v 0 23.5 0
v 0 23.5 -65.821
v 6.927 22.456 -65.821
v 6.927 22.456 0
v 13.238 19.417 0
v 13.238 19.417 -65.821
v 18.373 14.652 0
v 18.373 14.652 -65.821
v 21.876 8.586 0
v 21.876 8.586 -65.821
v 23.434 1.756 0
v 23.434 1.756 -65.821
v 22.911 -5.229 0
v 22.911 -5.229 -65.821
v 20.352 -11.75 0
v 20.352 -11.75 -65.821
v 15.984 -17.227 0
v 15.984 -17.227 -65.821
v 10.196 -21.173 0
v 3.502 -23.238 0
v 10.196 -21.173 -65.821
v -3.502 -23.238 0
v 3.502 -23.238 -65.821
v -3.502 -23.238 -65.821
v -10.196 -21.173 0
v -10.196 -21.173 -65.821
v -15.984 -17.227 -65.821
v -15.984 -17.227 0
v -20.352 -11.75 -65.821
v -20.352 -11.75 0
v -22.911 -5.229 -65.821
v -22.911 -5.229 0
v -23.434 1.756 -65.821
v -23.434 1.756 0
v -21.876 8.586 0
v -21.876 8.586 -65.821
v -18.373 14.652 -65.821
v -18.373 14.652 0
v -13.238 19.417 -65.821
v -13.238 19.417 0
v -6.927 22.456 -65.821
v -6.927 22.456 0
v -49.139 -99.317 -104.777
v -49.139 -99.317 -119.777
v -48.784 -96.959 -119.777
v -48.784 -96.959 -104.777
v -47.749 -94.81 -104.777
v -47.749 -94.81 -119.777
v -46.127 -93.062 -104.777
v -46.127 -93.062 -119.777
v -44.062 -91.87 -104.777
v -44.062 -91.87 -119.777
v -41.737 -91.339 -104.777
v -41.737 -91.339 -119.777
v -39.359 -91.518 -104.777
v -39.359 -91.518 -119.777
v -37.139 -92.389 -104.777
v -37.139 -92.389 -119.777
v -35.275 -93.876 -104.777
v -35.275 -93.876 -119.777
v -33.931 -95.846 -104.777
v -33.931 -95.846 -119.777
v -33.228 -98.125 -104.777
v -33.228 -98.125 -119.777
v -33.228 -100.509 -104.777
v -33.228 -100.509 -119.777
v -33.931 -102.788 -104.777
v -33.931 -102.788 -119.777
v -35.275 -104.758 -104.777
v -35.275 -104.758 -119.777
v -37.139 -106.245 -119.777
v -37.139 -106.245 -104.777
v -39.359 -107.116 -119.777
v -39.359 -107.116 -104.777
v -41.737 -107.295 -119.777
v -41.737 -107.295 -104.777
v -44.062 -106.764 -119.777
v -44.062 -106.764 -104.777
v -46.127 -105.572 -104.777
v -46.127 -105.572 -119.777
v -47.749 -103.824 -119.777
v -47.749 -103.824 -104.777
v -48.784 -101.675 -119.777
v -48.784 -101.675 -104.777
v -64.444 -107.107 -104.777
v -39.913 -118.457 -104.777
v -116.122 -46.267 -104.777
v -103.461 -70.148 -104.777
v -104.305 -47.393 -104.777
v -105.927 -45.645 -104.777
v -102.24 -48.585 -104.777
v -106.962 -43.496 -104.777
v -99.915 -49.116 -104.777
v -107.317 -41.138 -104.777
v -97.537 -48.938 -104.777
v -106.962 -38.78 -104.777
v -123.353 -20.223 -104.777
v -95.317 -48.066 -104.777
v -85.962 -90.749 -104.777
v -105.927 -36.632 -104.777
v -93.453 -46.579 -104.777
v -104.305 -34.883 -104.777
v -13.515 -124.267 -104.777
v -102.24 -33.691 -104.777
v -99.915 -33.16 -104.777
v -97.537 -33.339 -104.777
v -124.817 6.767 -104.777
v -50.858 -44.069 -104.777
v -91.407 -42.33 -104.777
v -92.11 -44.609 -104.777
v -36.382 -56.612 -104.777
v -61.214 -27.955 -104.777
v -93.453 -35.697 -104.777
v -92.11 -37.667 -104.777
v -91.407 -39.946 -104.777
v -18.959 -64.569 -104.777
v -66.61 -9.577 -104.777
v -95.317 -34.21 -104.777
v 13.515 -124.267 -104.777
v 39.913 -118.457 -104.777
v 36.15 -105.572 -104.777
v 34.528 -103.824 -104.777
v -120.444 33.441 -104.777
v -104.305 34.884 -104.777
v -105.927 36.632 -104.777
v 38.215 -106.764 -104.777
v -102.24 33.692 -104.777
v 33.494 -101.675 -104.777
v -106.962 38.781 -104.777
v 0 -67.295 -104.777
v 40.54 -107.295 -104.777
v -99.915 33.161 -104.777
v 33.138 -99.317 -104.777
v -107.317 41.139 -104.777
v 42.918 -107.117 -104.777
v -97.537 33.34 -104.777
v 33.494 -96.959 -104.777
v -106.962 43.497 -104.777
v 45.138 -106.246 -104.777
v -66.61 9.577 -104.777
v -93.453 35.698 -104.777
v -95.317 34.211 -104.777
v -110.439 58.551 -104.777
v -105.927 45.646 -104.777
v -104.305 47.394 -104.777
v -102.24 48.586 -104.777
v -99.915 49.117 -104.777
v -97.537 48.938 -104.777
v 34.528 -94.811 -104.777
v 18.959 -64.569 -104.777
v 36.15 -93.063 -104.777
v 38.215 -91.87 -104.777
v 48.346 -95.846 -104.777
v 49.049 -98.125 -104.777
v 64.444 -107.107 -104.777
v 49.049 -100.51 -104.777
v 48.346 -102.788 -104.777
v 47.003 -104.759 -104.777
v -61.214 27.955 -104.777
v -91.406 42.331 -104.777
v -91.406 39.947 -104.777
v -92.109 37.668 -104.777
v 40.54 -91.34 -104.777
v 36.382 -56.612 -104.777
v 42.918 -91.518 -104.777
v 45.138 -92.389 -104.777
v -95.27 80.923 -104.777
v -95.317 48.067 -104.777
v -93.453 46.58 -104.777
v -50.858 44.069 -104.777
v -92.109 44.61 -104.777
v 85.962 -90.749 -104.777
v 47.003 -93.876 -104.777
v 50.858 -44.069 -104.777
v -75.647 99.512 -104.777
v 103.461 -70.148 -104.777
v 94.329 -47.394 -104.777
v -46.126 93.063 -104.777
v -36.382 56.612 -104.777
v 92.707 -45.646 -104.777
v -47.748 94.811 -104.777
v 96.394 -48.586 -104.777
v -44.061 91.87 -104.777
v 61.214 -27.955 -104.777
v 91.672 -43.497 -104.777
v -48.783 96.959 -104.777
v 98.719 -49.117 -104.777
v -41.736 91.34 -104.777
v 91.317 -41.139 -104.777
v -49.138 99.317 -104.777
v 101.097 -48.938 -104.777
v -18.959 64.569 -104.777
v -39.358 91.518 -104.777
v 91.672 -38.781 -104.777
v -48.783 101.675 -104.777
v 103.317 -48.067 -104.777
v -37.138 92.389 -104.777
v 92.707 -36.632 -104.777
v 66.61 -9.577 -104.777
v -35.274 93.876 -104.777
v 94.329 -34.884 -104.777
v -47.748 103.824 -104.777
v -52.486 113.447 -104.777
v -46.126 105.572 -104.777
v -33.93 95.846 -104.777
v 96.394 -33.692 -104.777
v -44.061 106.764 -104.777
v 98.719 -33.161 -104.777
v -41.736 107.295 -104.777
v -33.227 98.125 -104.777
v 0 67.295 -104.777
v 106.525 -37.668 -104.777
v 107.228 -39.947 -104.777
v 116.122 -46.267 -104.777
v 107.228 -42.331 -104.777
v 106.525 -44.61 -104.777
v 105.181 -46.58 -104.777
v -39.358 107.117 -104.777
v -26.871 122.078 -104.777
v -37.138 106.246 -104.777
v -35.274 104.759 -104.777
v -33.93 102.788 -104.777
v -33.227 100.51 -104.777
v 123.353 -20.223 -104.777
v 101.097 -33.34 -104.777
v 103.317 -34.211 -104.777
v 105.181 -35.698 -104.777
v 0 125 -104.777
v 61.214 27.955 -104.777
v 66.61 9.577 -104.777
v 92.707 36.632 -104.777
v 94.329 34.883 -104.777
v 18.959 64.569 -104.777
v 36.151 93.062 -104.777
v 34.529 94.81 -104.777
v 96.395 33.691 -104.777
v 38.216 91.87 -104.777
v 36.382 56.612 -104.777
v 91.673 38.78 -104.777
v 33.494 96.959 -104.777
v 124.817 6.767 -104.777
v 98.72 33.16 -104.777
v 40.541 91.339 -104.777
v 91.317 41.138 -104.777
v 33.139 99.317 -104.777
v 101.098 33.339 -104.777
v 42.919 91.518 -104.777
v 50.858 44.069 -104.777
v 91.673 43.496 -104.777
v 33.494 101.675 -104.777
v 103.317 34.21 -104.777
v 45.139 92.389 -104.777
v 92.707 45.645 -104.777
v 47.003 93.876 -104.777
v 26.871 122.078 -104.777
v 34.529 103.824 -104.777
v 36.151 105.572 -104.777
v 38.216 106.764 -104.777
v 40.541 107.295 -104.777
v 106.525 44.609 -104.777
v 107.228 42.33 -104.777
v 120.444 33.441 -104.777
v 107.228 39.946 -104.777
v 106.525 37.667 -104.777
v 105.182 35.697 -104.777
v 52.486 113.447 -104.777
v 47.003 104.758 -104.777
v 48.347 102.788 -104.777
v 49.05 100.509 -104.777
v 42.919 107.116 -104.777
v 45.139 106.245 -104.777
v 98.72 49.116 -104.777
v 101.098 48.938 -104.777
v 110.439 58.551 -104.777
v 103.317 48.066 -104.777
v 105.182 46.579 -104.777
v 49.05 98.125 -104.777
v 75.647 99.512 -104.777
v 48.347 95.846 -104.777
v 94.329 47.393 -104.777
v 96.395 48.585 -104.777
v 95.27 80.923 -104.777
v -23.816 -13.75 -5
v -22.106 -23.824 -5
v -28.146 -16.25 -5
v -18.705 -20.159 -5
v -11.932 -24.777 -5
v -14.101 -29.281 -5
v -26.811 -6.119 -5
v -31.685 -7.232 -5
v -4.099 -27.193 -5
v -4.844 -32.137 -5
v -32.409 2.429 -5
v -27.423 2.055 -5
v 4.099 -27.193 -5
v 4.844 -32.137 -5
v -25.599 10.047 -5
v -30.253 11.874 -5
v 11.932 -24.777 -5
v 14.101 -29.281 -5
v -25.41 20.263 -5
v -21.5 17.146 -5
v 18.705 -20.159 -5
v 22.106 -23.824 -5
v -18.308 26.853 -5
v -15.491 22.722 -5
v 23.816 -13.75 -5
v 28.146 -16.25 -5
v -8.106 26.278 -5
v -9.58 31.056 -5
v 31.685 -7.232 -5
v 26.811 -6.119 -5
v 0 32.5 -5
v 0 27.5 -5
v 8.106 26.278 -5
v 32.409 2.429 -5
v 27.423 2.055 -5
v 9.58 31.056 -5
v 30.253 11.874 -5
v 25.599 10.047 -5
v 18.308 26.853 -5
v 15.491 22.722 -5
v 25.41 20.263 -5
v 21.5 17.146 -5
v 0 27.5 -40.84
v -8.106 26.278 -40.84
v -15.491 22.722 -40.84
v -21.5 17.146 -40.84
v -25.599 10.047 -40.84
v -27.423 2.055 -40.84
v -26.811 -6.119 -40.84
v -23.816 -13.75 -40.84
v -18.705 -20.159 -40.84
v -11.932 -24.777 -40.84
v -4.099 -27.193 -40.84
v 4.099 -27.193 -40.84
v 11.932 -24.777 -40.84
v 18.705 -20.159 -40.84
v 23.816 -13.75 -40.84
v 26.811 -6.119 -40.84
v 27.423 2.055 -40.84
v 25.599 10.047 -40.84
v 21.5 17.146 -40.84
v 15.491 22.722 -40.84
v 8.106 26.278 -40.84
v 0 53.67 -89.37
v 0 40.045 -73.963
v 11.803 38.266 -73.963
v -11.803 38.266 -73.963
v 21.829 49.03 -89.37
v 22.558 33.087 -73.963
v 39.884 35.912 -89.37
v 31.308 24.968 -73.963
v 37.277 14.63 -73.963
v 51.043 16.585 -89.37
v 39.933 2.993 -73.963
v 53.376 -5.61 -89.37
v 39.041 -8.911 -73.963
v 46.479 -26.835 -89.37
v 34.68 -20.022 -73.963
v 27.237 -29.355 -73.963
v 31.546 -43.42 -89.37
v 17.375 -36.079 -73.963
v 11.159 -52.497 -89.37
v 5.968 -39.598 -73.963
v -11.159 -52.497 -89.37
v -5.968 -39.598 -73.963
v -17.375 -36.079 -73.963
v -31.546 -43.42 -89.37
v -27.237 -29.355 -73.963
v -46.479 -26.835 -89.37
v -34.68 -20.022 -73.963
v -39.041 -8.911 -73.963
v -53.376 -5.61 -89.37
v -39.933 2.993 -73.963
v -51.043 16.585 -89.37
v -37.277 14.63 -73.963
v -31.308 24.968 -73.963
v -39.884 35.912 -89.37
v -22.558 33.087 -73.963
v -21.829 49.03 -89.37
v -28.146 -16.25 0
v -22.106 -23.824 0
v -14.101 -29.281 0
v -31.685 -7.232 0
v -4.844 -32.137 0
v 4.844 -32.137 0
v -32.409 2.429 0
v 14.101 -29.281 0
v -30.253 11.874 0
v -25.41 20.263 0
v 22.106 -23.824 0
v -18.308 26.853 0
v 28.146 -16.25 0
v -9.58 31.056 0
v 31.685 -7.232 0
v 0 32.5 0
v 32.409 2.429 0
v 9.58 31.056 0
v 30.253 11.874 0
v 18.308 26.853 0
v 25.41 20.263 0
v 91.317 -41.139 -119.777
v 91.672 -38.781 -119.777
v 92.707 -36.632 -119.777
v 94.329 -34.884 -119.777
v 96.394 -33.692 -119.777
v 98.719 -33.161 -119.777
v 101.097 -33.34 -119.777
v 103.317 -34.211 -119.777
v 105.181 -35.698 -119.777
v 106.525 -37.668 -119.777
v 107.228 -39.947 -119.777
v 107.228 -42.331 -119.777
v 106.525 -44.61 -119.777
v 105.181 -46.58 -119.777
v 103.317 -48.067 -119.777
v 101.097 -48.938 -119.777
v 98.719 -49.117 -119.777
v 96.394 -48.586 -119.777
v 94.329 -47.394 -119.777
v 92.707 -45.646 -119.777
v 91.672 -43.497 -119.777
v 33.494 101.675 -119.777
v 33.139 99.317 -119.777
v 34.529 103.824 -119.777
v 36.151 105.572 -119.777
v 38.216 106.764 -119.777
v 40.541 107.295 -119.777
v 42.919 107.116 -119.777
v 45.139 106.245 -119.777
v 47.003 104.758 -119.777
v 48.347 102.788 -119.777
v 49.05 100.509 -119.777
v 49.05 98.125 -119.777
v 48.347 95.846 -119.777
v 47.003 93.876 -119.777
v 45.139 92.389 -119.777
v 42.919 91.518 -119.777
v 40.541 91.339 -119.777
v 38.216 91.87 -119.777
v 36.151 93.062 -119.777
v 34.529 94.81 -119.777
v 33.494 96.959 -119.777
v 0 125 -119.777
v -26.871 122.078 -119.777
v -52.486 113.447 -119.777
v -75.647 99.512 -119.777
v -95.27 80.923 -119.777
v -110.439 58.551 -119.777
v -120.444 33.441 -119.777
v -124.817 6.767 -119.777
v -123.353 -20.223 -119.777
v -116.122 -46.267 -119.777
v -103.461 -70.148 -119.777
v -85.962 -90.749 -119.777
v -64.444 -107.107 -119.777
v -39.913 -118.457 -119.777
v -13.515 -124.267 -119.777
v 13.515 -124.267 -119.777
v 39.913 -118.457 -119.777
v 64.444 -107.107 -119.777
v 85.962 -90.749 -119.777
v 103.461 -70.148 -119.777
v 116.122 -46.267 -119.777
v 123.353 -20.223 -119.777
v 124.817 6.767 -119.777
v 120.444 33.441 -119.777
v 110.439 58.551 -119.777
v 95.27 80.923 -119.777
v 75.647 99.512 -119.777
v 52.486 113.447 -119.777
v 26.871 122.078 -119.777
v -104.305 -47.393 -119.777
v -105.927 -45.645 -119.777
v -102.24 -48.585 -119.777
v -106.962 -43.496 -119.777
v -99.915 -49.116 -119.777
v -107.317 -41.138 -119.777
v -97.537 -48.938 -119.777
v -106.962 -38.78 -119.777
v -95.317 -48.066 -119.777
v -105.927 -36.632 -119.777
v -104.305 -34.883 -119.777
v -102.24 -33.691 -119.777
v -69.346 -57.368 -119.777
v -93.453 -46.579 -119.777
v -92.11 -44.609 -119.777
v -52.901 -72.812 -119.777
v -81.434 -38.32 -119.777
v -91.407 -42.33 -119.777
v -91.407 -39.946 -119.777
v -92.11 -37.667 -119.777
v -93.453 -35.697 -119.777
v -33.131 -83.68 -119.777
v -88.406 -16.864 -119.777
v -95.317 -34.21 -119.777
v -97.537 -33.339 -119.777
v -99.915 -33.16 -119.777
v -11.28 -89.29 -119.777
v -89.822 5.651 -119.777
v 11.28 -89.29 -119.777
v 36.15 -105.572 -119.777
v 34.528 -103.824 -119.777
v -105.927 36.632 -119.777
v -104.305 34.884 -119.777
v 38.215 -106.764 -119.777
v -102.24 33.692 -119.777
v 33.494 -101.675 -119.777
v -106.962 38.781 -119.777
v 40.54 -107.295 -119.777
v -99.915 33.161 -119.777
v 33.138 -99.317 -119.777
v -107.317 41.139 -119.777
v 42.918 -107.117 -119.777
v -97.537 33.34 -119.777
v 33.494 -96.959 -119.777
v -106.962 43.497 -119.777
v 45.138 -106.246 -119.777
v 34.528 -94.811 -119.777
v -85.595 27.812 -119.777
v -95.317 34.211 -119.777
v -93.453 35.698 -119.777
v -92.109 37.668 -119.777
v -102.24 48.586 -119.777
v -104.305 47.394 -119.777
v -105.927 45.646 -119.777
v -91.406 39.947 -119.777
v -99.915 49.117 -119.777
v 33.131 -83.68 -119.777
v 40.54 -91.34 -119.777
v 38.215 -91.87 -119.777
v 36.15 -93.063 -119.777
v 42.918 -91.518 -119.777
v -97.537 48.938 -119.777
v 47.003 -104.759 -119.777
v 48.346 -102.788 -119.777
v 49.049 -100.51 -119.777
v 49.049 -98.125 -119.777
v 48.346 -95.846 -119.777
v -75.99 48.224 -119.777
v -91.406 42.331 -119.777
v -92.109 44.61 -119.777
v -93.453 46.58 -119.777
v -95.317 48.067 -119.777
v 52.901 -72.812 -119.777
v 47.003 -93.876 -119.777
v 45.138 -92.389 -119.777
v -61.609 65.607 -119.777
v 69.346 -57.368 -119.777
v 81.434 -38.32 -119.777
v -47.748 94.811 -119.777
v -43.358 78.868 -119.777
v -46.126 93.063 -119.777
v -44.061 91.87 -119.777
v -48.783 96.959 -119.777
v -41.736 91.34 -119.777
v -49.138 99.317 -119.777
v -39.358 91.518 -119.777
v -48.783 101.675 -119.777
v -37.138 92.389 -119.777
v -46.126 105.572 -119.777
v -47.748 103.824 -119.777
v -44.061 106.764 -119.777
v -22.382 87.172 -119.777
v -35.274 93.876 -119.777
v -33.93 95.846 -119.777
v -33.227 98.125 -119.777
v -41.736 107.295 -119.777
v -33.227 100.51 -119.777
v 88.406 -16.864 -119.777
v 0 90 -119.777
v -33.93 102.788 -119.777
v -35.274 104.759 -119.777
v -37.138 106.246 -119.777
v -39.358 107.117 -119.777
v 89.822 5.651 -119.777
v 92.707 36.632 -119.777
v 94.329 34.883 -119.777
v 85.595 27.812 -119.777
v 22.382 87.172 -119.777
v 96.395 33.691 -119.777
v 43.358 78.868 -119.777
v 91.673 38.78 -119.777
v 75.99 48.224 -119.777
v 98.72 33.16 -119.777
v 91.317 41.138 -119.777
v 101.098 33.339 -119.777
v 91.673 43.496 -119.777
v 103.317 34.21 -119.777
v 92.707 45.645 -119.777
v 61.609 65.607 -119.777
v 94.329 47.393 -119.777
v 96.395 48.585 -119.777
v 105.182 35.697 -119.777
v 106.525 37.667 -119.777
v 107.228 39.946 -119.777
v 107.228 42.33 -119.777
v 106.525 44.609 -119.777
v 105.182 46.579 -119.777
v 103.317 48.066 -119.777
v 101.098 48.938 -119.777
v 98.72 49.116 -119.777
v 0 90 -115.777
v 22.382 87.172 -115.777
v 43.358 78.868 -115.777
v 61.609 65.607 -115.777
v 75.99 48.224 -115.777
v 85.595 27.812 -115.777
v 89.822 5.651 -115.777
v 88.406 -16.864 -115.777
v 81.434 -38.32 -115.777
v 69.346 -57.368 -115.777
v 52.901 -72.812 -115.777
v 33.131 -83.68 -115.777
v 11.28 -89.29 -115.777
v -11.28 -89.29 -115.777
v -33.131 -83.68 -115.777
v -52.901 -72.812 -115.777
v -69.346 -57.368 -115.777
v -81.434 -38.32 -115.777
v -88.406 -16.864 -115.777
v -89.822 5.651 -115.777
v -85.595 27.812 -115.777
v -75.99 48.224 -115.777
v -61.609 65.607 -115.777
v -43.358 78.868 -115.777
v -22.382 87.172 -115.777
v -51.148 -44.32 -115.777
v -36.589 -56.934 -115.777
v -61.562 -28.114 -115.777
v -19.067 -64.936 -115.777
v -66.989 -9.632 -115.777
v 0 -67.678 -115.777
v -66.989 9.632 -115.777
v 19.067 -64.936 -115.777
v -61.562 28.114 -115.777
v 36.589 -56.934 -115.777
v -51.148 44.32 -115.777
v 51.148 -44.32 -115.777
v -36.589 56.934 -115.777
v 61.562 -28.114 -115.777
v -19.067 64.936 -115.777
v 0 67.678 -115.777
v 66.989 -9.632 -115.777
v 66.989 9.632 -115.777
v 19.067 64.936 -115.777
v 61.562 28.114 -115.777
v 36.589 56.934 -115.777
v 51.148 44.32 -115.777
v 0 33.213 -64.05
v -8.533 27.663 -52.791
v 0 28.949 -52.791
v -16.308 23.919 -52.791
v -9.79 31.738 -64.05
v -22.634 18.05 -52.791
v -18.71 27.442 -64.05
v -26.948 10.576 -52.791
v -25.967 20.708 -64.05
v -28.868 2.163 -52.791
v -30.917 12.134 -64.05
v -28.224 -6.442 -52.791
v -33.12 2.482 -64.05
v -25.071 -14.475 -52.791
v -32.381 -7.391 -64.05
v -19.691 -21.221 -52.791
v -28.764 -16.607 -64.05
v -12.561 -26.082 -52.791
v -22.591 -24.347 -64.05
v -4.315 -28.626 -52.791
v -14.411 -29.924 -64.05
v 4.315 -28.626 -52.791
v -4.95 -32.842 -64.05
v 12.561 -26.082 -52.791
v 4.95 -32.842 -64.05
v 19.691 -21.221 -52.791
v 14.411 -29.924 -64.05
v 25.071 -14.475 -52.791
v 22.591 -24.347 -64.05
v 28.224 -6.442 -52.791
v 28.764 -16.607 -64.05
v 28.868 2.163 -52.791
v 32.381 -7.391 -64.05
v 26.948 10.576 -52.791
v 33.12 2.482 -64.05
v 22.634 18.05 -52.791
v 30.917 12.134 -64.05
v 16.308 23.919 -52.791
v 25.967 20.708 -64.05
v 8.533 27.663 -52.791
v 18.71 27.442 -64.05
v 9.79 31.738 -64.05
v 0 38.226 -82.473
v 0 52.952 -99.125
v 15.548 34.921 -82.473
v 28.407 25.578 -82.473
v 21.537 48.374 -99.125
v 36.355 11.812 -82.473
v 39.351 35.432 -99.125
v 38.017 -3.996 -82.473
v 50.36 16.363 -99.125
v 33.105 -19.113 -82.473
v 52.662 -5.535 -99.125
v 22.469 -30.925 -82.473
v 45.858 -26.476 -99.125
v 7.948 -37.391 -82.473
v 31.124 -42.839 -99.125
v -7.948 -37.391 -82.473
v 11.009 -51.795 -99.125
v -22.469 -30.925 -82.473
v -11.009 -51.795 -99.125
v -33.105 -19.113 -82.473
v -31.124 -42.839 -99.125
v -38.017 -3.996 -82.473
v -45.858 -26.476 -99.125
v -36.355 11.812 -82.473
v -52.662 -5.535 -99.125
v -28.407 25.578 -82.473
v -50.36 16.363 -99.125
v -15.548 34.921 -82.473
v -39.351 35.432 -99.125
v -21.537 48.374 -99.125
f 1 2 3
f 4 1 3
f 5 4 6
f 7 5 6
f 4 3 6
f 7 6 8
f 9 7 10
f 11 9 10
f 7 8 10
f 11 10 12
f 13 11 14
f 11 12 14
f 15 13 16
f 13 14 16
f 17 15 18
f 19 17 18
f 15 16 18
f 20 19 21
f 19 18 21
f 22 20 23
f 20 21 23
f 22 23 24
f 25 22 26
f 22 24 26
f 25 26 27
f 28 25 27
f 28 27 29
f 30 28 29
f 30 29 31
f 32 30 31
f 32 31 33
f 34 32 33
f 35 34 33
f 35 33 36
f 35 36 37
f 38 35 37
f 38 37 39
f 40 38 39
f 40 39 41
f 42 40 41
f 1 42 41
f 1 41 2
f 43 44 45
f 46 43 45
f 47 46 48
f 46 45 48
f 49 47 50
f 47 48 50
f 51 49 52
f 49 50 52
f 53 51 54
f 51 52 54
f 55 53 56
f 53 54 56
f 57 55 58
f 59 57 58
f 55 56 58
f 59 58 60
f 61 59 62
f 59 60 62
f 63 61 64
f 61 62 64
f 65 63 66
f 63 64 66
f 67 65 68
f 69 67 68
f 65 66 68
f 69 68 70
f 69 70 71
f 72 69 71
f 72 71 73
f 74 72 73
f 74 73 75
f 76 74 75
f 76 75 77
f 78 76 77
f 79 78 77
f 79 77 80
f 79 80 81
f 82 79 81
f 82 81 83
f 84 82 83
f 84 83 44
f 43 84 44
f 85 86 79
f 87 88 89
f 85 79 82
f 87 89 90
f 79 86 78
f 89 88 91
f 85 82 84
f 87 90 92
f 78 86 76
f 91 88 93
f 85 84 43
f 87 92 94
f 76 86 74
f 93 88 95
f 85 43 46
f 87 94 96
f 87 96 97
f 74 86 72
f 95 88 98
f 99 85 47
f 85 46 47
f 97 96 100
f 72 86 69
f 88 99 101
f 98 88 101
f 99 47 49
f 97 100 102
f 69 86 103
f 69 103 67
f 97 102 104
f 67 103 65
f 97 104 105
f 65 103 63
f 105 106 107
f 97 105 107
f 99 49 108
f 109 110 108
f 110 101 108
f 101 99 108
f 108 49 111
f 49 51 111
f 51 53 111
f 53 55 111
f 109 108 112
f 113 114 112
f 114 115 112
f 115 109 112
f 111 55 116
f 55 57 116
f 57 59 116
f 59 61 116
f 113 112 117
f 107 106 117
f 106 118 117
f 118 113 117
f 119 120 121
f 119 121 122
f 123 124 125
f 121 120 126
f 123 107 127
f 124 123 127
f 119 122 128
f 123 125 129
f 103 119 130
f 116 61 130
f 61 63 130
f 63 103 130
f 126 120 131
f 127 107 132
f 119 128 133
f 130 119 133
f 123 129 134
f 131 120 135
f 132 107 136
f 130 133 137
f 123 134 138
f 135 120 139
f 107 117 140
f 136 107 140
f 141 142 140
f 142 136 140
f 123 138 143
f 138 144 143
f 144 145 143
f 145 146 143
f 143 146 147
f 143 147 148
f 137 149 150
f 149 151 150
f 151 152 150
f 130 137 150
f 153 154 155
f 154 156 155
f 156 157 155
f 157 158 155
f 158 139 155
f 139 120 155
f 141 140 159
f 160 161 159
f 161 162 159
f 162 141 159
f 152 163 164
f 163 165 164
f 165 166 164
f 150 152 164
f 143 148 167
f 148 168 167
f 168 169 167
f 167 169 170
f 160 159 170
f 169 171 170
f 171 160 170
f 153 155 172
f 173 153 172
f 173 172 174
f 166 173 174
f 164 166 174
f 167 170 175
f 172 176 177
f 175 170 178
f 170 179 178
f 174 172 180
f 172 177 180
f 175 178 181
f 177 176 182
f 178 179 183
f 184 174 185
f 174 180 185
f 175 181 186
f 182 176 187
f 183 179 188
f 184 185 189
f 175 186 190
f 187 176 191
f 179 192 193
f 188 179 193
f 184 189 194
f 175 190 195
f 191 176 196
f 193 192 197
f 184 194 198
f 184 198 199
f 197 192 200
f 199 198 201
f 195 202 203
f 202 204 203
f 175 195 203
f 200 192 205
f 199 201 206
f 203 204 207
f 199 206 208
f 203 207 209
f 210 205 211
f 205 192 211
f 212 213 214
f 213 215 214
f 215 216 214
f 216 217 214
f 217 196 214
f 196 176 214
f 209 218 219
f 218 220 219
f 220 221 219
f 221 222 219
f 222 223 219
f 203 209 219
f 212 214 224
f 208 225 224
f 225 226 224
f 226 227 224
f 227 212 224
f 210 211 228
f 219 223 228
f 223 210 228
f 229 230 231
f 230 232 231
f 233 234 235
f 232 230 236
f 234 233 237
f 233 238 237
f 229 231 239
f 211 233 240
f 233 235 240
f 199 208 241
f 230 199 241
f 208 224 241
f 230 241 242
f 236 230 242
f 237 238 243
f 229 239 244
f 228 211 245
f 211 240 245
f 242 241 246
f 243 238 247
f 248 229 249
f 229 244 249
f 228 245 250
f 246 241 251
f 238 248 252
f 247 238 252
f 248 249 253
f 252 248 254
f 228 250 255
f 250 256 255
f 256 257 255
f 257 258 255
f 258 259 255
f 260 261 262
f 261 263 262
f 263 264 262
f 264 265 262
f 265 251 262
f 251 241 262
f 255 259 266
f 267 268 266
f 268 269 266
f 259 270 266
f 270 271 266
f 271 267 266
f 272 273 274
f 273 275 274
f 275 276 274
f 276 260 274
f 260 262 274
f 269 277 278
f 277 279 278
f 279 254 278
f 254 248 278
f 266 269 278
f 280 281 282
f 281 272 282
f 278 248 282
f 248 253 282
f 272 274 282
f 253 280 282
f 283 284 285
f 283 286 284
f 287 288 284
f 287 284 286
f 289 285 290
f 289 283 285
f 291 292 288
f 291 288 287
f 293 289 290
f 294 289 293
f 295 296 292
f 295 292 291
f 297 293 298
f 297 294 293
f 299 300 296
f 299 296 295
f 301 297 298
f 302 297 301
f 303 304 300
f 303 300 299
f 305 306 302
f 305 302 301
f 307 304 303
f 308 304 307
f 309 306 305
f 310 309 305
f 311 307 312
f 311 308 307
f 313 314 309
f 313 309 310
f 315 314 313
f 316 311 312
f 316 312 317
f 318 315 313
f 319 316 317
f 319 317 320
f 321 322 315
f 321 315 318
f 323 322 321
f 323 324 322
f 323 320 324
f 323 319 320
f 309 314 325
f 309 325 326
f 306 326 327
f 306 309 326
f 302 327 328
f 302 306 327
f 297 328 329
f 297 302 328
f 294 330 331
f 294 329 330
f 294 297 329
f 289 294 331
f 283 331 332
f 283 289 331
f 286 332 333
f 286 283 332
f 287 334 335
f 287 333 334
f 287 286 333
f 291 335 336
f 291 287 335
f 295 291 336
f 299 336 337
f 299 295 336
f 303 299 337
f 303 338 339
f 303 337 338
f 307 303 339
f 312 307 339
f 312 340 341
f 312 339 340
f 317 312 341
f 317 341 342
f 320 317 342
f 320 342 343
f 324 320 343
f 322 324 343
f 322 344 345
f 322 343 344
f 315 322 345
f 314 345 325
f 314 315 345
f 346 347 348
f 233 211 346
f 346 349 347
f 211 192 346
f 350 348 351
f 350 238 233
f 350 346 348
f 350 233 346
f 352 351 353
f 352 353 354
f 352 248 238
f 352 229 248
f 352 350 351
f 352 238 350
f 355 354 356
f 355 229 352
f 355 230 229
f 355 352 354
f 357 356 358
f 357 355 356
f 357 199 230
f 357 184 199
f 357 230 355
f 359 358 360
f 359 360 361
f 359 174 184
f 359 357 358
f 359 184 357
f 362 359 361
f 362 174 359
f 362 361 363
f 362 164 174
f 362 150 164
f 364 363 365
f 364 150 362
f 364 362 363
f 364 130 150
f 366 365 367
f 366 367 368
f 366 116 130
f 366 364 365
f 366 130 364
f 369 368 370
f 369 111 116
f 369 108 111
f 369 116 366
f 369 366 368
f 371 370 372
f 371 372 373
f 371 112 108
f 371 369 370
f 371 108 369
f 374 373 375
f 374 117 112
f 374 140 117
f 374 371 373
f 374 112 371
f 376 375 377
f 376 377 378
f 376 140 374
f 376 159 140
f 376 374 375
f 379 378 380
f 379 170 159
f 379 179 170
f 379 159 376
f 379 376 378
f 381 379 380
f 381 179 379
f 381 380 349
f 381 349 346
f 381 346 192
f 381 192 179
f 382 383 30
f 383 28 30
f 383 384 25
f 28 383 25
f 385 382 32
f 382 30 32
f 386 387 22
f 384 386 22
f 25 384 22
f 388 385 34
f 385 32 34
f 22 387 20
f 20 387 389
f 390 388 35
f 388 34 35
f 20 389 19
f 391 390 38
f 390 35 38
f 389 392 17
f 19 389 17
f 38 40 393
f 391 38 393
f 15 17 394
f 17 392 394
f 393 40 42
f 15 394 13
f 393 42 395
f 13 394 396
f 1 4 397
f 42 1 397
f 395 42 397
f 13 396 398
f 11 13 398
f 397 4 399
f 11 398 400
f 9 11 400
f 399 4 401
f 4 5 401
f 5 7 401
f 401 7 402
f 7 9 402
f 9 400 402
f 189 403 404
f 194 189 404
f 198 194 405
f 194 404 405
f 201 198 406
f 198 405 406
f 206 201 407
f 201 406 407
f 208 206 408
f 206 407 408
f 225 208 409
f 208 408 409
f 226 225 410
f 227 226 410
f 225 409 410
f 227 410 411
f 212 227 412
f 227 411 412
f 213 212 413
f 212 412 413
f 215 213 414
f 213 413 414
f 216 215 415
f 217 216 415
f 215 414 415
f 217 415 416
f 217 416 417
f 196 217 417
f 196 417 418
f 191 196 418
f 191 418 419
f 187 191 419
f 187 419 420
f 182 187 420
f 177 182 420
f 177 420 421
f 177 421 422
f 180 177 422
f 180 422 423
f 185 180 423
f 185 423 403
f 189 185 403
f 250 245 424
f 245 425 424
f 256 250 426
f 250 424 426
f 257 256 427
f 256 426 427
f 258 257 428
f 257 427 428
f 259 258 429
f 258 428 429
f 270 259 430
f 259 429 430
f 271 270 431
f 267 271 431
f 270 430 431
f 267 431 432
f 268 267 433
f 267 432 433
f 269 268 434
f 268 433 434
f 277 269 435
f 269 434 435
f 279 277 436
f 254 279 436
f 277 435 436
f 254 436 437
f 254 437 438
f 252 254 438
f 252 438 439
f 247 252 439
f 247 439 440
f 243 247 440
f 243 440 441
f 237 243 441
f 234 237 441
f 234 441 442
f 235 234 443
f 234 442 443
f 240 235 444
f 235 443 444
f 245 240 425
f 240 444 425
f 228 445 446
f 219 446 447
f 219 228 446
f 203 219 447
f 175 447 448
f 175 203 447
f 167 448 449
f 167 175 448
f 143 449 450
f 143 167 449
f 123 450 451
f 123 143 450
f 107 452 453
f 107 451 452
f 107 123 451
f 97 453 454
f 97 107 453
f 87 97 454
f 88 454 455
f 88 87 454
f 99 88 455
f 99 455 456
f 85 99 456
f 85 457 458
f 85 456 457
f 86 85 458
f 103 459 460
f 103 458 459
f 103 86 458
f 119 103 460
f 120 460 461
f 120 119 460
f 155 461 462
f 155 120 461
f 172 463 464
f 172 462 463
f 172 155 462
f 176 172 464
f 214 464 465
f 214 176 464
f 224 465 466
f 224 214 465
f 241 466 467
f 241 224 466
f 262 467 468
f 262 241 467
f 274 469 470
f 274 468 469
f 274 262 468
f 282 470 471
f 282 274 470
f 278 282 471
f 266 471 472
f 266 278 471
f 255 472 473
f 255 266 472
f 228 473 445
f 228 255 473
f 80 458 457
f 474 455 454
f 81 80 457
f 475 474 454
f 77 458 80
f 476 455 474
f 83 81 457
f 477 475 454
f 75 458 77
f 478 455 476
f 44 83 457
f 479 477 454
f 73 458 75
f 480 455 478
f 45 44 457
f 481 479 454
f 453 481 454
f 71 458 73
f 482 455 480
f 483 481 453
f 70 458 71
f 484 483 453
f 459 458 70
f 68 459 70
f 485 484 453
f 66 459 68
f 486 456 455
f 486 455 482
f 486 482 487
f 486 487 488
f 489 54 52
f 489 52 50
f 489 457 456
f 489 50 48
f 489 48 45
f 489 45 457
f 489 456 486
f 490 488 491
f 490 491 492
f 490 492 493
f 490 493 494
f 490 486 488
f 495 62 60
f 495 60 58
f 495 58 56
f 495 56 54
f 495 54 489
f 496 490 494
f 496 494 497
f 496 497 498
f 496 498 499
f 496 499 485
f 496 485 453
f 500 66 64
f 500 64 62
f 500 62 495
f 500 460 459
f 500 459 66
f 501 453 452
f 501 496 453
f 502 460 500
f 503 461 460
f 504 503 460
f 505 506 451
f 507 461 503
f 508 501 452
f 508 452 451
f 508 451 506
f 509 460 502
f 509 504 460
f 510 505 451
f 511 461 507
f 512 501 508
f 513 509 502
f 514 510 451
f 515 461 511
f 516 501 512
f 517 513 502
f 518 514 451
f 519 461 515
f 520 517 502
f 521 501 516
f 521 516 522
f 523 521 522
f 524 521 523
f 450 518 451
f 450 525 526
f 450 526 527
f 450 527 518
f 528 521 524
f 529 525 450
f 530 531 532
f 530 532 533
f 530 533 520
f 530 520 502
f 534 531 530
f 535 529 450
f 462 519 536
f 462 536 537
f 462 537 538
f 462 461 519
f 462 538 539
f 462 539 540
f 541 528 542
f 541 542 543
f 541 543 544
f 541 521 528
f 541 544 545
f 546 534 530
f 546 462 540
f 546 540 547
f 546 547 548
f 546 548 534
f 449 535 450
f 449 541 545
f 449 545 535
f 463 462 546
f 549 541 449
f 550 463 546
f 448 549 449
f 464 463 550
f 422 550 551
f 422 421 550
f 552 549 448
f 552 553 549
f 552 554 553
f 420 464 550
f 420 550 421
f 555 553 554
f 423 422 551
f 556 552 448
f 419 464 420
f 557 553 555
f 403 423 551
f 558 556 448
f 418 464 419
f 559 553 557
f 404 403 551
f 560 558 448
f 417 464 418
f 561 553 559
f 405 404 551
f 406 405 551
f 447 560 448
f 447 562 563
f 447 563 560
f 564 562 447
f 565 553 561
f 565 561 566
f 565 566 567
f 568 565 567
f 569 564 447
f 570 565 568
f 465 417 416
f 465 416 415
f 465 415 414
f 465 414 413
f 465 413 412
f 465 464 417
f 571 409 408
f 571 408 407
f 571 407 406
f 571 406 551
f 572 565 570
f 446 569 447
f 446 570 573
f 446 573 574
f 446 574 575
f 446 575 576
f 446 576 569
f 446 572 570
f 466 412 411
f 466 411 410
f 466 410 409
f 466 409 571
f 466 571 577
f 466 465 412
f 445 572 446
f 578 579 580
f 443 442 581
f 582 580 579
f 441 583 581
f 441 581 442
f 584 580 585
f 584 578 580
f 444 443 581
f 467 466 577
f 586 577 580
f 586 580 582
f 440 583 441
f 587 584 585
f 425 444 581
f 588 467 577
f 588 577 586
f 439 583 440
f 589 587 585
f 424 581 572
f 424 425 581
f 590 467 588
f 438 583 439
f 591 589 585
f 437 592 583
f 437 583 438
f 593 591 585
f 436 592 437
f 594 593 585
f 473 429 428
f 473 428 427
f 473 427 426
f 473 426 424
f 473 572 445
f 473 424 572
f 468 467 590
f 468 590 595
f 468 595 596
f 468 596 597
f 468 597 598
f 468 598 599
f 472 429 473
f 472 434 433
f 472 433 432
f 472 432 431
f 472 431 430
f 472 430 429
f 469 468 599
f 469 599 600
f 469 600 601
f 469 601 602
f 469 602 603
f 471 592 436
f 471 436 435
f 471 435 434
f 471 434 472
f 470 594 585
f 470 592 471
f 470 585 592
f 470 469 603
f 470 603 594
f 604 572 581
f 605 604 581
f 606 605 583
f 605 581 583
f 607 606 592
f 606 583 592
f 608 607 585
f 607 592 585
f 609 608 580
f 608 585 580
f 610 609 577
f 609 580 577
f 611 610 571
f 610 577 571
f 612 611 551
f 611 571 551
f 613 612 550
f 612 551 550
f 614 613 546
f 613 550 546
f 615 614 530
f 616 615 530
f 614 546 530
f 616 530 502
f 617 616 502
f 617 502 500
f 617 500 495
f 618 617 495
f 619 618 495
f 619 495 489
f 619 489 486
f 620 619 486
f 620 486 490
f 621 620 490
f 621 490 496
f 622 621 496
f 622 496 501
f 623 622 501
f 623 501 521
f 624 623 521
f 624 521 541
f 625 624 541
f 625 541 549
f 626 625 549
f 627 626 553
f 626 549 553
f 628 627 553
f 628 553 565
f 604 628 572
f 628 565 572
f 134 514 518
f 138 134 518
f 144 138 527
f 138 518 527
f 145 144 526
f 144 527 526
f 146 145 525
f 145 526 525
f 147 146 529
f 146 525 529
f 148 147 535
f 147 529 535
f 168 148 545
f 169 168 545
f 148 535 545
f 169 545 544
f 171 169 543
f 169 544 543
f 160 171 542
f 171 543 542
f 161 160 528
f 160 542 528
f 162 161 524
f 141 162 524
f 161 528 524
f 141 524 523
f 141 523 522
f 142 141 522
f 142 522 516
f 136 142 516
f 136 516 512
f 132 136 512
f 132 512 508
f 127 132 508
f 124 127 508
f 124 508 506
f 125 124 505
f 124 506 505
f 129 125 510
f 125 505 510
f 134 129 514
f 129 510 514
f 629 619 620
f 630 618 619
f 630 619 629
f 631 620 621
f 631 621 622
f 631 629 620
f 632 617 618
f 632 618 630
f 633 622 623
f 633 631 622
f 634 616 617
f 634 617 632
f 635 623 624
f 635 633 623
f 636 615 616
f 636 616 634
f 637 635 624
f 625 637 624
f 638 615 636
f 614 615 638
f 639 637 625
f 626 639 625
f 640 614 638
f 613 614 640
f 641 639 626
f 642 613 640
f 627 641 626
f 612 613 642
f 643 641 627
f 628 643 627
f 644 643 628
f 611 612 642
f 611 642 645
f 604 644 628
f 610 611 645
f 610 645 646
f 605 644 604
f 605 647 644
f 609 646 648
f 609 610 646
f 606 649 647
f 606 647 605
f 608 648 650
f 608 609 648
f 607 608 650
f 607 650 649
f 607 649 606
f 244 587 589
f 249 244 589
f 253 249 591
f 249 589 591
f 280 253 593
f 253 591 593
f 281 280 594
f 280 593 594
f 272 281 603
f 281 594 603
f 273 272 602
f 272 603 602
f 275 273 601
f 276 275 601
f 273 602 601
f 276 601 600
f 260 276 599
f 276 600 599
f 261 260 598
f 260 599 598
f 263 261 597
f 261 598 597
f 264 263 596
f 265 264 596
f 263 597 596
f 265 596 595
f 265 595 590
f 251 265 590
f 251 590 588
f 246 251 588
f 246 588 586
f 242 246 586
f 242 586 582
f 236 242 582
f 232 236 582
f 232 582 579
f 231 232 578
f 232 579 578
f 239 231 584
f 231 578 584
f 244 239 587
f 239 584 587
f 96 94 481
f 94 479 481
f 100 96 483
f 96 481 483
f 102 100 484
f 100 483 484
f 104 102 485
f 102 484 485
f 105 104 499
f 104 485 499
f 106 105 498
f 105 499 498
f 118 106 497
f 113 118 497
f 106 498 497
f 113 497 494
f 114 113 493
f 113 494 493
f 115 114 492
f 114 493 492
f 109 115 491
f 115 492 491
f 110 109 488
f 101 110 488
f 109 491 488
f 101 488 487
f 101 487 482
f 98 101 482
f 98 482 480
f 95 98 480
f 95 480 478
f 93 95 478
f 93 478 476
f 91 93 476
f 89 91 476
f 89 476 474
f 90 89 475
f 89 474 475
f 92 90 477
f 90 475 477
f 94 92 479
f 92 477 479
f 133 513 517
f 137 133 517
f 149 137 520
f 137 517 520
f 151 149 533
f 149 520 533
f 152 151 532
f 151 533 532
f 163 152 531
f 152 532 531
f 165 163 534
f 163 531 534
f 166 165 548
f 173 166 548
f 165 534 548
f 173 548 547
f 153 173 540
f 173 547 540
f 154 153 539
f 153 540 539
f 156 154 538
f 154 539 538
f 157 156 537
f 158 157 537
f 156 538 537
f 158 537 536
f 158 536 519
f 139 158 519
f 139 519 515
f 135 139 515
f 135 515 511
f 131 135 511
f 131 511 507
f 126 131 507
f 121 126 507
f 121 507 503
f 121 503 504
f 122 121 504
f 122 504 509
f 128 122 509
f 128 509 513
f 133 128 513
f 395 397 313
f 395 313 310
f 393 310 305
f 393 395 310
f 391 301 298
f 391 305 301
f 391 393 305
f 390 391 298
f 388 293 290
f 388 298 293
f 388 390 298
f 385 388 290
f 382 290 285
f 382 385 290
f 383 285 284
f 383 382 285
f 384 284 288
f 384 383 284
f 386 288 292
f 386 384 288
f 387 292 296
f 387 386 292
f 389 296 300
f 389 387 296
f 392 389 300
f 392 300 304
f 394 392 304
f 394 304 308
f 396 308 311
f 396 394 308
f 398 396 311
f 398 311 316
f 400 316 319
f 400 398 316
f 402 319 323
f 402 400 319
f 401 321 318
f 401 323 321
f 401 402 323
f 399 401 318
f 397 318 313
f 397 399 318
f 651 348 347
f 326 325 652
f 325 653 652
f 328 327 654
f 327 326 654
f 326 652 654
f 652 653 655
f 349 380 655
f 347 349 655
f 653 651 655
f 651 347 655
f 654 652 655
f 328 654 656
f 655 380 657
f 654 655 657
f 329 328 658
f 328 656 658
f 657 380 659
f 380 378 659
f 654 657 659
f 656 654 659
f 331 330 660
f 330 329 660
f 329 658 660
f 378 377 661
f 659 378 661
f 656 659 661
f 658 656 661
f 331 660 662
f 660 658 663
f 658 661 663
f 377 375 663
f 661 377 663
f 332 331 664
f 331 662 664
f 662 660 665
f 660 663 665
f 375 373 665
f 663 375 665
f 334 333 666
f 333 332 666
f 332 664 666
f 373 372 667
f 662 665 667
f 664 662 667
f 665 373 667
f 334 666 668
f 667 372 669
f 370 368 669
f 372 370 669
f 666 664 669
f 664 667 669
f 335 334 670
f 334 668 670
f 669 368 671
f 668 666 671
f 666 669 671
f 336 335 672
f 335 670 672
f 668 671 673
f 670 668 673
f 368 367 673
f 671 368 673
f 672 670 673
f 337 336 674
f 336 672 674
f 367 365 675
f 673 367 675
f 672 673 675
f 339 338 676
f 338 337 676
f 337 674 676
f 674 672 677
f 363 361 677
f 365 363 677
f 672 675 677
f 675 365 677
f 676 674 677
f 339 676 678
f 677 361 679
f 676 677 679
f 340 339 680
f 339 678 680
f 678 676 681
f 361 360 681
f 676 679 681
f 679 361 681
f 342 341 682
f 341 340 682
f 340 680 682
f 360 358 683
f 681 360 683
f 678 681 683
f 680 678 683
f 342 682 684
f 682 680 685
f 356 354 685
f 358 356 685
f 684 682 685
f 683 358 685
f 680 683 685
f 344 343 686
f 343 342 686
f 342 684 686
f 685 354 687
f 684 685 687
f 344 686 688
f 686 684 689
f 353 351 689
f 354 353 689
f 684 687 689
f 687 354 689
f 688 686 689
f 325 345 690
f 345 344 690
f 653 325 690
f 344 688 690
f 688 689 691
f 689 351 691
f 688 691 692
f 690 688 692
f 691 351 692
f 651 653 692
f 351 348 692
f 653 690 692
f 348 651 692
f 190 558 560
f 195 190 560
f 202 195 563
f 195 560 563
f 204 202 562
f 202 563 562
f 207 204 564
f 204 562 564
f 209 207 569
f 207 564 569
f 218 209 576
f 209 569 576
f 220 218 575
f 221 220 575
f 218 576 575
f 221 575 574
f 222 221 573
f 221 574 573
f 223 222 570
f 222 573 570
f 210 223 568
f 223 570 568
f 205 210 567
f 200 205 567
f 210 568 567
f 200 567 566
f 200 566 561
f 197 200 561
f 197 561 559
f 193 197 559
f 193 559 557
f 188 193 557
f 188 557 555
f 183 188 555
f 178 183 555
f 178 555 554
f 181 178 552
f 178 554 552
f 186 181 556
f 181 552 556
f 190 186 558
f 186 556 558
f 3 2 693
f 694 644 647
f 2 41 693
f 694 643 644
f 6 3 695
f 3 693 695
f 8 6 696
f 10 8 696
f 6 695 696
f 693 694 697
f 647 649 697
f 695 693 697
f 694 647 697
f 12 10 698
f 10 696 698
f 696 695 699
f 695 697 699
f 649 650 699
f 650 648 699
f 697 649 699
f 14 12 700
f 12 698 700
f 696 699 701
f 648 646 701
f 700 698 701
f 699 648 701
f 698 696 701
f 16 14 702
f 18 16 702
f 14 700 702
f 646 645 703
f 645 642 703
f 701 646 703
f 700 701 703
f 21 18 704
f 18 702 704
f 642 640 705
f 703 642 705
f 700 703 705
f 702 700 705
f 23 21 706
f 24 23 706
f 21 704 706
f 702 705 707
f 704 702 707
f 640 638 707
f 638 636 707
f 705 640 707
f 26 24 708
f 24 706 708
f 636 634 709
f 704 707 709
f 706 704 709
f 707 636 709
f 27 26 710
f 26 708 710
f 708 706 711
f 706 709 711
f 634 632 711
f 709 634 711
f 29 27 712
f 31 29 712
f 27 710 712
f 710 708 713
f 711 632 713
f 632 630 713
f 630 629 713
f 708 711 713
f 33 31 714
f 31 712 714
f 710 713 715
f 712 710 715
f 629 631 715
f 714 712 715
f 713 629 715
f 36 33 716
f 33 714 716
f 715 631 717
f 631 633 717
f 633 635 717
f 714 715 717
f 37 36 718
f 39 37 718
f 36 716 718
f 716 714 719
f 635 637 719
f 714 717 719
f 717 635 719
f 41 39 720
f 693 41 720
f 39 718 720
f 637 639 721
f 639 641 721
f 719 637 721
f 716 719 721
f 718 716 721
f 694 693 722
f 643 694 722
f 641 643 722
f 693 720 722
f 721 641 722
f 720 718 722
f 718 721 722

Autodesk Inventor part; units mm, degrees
ref_plane "YZ Plane" through (0, 0, 0) normal (1, 0, 0) x (0, 1, 0)
ref_plane "XZ Plane" through (0, 0, 0) normal (0, 1, 0) x (-1, 0, 0)
ref_plane "XY Plane" through (0, 0, 0) normal (0, 0, 1) x (1, 0, 0)
sketch "Эскиз1" plane through (0, 0, 0) normal (1, 0, 0) x (0, 1, 0)
  line L0 (0, 0) -> (0, -73.7994) construction
  line L1 (23.5, 0) -> (23.5, -65.8206)
  line L2 (23.5, -65.8206) -> (67.6779, -115.777)
  line L3 (125, -110.9688) -> (125, -104.777)
  line L4 (125, -104.777) -> (67.2948, -104.777)
  line L5 (67.2948, -104.777) -> (40.0448, -73.9627)
  line L6 (27.5, -40.8401) -> (27.5, -5)
  line L7 (27.5, -5) -> (32.5, -5)
  line L8 (32.5, -5) -> (32.5, 0)
  line L9 (32.5, 0) -> (23.5, 0)
  line L10 (67.6779, -115.777) -> (90, -115.777)
  line L11 (90, -115.777) -> (90, -119.777)
  line L12 (90, -119.777) -> (125, -119.777)
  line L13 (125, -119.777) -> (125, -110.9688)
  arc A0 (27.5, -40.8401) -> (40.0448, -73.9627) centre (77.5, -40.8401) ccw
  point P0 (27.5, -59.777)
  point P1 (125, -98)
  dimension "d13" = 47
  dimension "d14" = 180
  dimension "d15" = 250
  dimension "d16" = 7
  dimension "d18" = 0
  dimension "d19" = 15
  dimension "d20" = 4
  dimension "d21" = 65
  dimension "d22" = 4
  dimension "d23" = 5
  dimension "d24" = 59.777
  dimension "d25" = 60
  dimension "d53" = 50
revolve "Вращение1" add sketch "Эскиз1" angle 360 about axis through (0, 0, 0) along (0, 0, -1)
sketch "Эскиз2" plane through (0, 0, -119.777) normal (0, 0, -1) x (-1, 0, 0)
  circle A0 centre (-41.139, 99.317) radius 8
  circle A1 centre (0, 0) radius 107.5
  circle A2 centre (-99.3174, 41.1381) radius 8
  circle A3 centre (-99.317, -41.139) radius 8
  circle A4 centre (-41.1381, -99.3174) radius 8
  circle A5 centre (41.139, -99.317) radius 8
  circle A6 centre (99.3174, -41.1381) radius 8
  circle A7 centre (99.317, 41.139) radius 8
  circle A8 centre (41.1381, 99.3174) radius 8
  dimension "d27" = 215
  dimension "d28" = 16
  dimension "d29" = 41.139
  dimension "d30" = 99.317
  dimension "d33" = 360
extrude "Выдавливание1" cut sketch "Эскиз2" against normal through all contours A0 A1 | A1 A0 | A8 A1 | A1 A8 | A2 A1 | A1 A2 | A7 A1 | A1 A7 | A3 A1 | A1 A3 | A4 A1 | A1 A4 | A6 A1 | A1 A6 | A5 A1 | A1 A5
thread "Резьба9" size "M16x2" class "6H" standard "ISO Metric profile" length 18
thread "Резьба10" size "M16x2" class "6H" standard "ANSI Metric M Profile" length 18
thread "Резьба11" size "M16x2" class "6H" standard "ANSI Metric M Profile" length 18
thread "Резьба12" size "M16x2" class "6H" standard "ANSI Metric M Profile" length 18
thread "Резьба13" size "M16x2" class "6H" standard "ANSI Metric M Profile" length 18
thread "Резьба14" size "M16x2" class "6H" standard "ANSI Metric M Profile" length 18
thread "Резьба15" size "M16x2" class "6H" standard "ANSI Metric M Profile" length 18
thread "Резьба16" size "M16x2" class "6H" standard "ANSI Metric M Profile" length 18
properties part number "Крышка_быстроходного"
